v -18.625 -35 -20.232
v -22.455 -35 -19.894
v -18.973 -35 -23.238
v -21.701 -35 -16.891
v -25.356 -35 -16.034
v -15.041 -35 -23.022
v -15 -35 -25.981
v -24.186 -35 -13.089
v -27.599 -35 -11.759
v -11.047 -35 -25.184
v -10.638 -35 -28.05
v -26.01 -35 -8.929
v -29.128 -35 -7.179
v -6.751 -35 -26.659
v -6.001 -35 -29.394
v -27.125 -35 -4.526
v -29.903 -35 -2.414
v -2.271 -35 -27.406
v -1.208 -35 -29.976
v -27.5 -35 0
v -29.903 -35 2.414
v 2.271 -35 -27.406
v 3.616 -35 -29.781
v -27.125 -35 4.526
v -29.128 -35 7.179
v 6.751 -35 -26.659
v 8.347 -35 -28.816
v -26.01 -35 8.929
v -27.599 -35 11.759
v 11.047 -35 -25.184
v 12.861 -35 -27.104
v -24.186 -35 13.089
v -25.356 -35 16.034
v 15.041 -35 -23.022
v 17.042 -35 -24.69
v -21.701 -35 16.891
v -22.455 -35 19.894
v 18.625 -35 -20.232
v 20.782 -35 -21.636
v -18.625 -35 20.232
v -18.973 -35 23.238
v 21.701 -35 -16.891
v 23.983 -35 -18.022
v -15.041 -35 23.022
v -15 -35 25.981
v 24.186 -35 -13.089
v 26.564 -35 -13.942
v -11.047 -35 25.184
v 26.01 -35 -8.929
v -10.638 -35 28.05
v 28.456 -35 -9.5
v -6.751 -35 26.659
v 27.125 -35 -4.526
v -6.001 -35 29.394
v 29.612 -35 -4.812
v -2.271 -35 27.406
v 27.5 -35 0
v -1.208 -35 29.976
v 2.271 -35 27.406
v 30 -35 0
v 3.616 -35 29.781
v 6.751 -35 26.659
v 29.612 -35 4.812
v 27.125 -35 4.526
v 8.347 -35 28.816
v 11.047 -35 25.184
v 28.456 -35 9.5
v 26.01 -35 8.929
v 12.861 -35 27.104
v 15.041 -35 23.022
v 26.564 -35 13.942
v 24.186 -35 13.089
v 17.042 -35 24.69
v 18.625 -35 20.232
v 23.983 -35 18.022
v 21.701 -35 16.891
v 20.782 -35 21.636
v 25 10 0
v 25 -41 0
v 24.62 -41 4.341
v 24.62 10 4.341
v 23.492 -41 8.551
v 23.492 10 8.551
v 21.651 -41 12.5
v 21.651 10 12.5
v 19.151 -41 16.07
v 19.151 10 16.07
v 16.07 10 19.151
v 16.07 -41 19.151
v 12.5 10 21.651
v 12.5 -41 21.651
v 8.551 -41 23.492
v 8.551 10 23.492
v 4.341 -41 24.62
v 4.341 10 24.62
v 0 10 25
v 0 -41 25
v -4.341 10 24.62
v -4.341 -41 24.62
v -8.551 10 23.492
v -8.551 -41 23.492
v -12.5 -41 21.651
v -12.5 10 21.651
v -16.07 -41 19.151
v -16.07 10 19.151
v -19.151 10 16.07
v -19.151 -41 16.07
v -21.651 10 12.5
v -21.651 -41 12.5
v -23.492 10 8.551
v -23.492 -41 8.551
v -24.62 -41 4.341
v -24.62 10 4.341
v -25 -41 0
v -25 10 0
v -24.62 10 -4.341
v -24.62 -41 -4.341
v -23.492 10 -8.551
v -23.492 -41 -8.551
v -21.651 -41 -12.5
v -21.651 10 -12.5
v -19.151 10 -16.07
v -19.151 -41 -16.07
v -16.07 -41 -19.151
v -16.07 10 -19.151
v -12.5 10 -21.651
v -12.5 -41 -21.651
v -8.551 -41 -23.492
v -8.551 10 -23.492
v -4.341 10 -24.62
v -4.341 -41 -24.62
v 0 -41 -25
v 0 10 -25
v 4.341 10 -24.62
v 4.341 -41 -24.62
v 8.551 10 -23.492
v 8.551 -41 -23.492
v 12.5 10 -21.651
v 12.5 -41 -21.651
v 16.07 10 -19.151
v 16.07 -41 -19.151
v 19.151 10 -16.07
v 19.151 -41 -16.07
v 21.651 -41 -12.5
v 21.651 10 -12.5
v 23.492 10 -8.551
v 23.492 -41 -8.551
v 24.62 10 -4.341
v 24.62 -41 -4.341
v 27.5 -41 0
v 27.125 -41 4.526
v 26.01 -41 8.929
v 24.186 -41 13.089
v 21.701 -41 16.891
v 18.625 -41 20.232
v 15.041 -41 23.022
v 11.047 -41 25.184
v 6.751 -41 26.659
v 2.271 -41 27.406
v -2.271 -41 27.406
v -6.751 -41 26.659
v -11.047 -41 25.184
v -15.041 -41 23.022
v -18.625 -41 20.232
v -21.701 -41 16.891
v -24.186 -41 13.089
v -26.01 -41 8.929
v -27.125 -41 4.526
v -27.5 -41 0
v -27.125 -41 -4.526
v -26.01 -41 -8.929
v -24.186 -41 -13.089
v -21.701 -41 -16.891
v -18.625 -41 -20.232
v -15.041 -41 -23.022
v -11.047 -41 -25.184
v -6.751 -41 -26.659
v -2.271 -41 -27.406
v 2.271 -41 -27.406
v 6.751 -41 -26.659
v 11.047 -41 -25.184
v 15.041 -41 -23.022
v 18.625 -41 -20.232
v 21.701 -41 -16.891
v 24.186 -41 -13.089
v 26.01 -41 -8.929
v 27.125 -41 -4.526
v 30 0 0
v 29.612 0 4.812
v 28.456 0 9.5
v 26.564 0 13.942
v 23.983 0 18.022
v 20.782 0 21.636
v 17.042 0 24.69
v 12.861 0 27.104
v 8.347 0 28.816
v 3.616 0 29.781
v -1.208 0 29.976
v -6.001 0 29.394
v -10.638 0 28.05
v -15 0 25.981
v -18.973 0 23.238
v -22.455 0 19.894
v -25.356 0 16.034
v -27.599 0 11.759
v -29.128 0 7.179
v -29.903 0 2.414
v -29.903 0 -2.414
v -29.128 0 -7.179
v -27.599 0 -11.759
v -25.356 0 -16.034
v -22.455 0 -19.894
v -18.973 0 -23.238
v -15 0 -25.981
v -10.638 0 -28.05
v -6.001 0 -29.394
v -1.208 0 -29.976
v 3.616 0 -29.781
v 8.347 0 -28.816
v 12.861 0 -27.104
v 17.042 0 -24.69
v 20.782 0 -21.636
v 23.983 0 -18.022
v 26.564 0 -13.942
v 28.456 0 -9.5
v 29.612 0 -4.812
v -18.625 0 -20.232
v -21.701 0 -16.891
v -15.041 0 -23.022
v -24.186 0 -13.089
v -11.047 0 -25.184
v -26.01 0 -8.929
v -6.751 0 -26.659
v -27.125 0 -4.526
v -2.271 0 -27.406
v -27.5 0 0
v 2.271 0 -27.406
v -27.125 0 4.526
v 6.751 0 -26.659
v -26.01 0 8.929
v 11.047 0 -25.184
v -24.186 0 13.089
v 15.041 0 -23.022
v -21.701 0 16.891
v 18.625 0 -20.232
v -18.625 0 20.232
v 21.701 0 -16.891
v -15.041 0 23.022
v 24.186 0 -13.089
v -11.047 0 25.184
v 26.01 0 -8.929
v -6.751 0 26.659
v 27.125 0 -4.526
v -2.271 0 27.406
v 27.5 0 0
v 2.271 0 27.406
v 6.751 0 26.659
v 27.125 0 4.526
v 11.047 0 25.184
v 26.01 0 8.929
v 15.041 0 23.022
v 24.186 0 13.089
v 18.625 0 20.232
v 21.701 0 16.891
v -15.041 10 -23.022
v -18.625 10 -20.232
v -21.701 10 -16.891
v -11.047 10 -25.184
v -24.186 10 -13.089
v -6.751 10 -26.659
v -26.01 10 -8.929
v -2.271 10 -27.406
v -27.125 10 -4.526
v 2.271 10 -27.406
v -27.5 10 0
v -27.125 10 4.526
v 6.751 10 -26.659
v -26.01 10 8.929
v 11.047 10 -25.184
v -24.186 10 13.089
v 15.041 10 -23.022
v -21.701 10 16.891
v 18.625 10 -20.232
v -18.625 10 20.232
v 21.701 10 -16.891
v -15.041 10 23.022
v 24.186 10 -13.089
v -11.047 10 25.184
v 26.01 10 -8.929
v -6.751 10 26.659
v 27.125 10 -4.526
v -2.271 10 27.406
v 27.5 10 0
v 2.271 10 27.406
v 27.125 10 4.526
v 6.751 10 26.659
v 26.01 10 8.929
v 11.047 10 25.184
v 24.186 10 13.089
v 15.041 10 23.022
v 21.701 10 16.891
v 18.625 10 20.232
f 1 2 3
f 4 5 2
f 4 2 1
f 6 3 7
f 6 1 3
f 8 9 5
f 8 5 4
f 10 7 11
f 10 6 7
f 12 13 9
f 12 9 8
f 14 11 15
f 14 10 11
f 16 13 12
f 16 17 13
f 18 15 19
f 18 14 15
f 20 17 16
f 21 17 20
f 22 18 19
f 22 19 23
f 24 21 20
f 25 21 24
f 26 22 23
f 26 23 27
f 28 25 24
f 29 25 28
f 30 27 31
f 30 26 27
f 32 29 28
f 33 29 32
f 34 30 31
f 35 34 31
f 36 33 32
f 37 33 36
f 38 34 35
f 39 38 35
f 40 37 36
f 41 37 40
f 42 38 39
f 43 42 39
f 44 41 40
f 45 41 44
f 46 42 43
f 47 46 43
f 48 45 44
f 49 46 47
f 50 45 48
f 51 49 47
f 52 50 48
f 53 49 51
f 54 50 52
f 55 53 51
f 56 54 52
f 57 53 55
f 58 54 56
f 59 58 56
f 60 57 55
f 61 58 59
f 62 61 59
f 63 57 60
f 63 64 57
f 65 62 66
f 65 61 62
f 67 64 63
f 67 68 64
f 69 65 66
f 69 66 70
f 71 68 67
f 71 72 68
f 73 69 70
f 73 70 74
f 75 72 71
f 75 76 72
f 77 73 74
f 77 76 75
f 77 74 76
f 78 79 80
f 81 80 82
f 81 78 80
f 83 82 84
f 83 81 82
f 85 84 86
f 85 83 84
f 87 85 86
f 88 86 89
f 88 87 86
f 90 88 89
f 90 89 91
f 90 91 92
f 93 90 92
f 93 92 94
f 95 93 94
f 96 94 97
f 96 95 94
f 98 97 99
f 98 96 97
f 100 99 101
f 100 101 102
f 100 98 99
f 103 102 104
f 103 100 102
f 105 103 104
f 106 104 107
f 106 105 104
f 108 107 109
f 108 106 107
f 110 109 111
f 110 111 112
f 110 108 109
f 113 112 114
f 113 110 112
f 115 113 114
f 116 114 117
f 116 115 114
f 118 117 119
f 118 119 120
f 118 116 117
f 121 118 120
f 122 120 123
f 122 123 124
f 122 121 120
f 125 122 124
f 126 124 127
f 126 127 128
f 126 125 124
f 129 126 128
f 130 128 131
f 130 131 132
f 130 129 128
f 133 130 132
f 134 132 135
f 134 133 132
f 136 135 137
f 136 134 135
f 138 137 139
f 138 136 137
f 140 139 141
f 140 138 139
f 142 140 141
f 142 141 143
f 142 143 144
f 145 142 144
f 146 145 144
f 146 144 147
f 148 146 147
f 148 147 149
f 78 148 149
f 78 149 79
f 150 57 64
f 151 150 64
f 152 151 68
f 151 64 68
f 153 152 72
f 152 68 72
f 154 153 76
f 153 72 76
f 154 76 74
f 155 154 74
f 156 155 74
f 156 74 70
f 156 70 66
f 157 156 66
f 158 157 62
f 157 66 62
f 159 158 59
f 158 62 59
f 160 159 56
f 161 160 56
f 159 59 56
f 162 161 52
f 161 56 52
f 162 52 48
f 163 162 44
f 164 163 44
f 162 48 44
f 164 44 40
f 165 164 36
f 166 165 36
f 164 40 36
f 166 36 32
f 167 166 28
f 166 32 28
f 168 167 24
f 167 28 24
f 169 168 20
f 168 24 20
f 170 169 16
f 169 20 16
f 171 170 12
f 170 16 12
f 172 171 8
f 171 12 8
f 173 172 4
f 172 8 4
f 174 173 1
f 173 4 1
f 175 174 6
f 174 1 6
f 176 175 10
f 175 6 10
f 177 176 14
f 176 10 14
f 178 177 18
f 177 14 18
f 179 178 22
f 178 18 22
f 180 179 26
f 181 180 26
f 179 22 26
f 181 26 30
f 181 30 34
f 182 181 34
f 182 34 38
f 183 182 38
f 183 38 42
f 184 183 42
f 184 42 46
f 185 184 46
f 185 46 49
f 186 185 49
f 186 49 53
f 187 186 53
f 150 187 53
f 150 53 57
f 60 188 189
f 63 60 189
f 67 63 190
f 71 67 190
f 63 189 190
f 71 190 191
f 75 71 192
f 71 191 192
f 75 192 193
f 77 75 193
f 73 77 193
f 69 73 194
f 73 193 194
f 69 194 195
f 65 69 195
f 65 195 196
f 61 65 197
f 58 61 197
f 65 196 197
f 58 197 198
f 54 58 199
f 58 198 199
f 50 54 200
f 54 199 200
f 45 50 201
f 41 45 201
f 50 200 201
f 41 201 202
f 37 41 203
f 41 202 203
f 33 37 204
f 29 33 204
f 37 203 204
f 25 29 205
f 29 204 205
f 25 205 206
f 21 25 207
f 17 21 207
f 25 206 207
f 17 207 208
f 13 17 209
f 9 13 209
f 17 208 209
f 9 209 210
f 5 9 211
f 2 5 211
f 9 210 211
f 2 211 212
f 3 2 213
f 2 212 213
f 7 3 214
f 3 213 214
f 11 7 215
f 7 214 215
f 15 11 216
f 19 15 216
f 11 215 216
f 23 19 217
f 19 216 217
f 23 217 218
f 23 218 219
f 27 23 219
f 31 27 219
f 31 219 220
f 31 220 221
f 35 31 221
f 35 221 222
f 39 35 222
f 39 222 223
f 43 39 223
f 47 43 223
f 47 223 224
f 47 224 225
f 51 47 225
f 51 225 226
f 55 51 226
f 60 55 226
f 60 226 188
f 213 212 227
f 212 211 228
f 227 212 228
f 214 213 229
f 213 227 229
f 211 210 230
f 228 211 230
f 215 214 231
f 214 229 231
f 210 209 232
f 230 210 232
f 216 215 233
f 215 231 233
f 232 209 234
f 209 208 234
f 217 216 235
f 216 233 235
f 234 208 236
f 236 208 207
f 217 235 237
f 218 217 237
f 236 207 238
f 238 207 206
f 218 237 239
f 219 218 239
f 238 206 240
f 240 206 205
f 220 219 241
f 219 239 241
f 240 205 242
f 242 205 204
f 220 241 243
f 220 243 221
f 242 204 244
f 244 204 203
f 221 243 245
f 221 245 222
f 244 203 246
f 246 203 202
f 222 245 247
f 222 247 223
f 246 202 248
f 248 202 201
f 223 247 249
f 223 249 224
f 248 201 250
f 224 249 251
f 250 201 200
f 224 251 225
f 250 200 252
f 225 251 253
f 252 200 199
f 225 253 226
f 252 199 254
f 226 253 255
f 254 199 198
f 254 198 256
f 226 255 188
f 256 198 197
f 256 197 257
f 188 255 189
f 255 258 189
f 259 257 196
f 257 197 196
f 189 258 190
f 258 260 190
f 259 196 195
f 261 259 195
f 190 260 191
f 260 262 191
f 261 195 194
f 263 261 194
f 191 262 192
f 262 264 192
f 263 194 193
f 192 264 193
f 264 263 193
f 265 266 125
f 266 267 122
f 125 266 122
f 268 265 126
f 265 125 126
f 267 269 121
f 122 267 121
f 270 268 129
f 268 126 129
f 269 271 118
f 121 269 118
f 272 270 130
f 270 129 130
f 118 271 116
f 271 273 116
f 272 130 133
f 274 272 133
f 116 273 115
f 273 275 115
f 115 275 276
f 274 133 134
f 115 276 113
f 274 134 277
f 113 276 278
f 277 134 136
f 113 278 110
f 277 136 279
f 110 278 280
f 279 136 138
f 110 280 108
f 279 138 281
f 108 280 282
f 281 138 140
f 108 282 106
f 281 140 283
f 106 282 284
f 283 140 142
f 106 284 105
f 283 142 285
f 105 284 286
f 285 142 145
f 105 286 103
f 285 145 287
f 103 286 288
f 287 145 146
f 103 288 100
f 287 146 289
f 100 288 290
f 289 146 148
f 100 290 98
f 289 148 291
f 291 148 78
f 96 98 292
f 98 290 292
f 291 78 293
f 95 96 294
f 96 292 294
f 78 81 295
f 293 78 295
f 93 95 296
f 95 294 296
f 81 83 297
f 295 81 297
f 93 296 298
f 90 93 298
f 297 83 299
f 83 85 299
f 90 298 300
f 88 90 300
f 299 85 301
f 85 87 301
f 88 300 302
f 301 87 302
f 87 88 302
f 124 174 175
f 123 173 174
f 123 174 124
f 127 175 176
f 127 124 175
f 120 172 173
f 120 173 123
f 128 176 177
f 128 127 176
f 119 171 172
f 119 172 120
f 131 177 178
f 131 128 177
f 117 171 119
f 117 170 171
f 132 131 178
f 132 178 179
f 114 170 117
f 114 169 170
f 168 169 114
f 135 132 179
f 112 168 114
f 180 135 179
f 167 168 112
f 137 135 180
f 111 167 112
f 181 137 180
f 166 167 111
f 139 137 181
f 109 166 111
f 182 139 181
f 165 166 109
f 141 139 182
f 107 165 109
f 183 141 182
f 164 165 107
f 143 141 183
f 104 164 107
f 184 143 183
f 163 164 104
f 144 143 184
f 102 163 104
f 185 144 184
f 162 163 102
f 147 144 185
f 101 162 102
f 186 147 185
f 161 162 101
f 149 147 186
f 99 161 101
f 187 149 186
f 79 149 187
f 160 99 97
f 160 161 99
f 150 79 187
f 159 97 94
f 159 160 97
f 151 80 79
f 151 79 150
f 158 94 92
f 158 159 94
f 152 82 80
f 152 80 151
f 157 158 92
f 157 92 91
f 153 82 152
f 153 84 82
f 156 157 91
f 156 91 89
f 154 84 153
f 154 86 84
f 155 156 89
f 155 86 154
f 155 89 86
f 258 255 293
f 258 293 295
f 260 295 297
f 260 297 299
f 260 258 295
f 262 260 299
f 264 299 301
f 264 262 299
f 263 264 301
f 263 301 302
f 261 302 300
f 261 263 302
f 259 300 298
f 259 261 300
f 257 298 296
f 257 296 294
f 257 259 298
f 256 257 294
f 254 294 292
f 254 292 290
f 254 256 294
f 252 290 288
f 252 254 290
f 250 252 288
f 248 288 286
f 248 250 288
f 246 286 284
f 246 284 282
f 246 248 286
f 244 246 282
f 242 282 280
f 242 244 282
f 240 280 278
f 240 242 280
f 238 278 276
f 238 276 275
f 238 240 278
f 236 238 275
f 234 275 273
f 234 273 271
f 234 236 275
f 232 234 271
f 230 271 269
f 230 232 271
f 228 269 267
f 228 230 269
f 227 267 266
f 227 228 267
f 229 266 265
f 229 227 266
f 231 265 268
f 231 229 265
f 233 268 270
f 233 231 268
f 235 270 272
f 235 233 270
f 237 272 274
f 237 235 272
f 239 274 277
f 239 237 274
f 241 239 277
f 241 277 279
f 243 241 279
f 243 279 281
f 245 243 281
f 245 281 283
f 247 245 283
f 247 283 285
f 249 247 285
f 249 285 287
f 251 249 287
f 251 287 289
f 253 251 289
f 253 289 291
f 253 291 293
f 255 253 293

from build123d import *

# Parameters (mm, degrees)
F0_R     = 30
F0_R_2   = 27.5
F0_R_3   = 25
F1_DEPTH = 35
F2_DEPTH = 10
F3_R     = 27.5
F3_R_2   = 25
F4_DEPTH = 6


with BuildPart() as f1:
    # F0 (on Front) → F1 (new body)
    with BuildSketch(Plane.XZ):
        Circle(F0_R)
        Circle(F0_R_2, mode=Mode.SUBTRACT)
        Circle(F0_R_2)
        Circle(F0_R_3, mode=Mode.SUBTRACT)
    extrude(amount=F1_DEPTH)

    # F0 (on Front) → F2 (join)
    with BuildSketch(Plane.XZ):
        Circle(F0_R_2)
        Circle(F0_R_3, mode=Mode.SUBTRACT)
    extrude(amount=-F2_DEPTH)

    # F3 (on face) → F4 (join)
    with BuildSketch(Plane.XZ.offset(35)):
        Circle(F3_R)
        Circle(F3_R_2, mode=Mode.SUBTRACT)
    extrude(amount=F4_DEPTH)


solid = f1.part
